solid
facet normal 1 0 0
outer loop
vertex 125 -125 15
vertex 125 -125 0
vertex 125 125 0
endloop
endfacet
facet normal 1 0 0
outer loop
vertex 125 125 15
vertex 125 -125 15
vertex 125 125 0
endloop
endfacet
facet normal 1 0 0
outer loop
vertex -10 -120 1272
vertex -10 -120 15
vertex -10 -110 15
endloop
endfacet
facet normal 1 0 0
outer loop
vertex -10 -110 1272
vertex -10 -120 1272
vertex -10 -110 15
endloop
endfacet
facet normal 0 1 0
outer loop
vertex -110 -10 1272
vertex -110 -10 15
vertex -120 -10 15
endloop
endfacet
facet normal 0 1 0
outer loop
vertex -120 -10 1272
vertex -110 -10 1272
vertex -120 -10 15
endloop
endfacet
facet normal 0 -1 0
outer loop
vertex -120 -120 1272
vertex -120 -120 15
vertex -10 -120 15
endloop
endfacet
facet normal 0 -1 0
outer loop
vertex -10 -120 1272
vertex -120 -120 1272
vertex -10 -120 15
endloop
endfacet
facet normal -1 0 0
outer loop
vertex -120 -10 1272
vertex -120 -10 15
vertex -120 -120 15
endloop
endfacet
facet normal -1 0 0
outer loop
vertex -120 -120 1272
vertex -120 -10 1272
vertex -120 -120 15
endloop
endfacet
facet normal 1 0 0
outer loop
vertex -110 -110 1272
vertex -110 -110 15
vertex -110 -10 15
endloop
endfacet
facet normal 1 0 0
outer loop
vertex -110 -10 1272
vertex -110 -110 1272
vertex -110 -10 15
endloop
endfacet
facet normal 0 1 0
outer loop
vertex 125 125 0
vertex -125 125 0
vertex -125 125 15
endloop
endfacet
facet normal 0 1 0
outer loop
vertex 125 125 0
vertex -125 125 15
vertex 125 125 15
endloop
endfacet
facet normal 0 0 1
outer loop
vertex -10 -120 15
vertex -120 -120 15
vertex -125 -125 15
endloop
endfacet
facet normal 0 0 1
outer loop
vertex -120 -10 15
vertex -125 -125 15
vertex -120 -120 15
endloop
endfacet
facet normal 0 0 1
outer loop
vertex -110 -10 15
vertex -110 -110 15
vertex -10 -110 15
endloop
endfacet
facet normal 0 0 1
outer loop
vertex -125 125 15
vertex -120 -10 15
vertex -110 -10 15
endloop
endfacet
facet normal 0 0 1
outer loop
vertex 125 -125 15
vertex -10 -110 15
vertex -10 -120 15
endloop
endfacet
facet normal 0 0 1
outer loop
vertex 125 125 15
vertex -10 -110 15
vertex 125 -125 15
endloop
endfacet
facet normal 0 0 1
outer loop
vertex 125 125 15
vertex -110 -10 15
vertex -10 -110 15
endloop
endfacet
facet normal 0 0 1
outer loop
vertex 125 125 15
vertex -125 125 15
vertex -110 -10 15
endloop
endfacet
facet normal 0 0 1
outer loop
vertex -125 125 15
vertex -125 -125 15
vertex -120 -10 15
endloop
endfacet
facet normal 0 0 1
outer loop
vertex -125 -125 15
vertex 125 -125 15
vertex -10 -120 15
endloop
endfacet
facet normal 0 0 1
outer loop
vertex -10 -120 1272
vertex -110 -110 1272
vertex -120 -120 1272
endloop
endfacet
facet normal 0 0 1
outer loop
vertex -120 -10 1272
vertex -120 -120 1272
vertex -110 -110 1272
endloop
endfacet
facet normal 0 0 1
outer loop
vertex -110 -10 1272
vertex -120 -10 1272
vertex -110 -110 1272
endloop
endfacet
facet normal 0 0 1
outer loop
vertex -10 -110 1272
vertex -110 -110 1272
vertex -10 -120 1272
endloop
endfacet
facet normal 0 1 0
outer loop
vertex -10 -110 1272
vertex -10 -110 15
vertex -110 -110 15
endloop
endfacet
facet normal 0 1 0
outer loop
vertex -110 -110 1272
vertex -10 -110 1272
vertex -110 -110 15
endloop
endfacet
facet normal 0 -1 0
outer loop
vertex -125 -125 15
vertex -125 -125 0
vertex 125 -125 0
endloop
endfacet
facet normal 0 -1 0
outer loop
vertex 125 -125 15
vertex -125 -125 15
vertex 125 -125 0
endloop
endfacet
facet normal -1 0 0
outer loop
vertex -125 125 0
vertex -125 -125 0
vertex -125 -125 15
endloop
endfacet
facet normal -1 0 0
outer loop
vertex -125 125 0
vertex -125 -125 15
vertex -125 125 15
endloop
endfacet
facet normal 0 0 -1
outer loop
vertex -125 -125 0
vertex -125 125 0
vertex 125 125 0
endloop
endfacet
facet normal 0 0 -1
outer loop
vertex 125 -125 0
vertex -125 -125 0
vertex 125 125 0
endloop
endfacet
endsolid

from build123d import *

# Parameters (mm, degrees)
F0_W     = 250
F0_H     = 250
F1_DEPTH = 15
F3_DEPTH = 1257


with BuildPart() as f1:
    # F0 (on Top) → F1 (new body)
    with BuildSketch(Plane.XY):
        Rectangle(F0_W, F0_H)
    extrude(amount=F1_DEPTH)

    # F2 (on face) → F3 (join)
    with BuildSketch(Plane.XY.offset(15)):
        Polygon((-110, -10), (-120, -10), (-120, -110), (-120, -120), (-110, -120), (-10, -120), (-10, -110), (-110, -110), align=None)
    extrude(amount=F3_DEPTH)


solid = f1.part
